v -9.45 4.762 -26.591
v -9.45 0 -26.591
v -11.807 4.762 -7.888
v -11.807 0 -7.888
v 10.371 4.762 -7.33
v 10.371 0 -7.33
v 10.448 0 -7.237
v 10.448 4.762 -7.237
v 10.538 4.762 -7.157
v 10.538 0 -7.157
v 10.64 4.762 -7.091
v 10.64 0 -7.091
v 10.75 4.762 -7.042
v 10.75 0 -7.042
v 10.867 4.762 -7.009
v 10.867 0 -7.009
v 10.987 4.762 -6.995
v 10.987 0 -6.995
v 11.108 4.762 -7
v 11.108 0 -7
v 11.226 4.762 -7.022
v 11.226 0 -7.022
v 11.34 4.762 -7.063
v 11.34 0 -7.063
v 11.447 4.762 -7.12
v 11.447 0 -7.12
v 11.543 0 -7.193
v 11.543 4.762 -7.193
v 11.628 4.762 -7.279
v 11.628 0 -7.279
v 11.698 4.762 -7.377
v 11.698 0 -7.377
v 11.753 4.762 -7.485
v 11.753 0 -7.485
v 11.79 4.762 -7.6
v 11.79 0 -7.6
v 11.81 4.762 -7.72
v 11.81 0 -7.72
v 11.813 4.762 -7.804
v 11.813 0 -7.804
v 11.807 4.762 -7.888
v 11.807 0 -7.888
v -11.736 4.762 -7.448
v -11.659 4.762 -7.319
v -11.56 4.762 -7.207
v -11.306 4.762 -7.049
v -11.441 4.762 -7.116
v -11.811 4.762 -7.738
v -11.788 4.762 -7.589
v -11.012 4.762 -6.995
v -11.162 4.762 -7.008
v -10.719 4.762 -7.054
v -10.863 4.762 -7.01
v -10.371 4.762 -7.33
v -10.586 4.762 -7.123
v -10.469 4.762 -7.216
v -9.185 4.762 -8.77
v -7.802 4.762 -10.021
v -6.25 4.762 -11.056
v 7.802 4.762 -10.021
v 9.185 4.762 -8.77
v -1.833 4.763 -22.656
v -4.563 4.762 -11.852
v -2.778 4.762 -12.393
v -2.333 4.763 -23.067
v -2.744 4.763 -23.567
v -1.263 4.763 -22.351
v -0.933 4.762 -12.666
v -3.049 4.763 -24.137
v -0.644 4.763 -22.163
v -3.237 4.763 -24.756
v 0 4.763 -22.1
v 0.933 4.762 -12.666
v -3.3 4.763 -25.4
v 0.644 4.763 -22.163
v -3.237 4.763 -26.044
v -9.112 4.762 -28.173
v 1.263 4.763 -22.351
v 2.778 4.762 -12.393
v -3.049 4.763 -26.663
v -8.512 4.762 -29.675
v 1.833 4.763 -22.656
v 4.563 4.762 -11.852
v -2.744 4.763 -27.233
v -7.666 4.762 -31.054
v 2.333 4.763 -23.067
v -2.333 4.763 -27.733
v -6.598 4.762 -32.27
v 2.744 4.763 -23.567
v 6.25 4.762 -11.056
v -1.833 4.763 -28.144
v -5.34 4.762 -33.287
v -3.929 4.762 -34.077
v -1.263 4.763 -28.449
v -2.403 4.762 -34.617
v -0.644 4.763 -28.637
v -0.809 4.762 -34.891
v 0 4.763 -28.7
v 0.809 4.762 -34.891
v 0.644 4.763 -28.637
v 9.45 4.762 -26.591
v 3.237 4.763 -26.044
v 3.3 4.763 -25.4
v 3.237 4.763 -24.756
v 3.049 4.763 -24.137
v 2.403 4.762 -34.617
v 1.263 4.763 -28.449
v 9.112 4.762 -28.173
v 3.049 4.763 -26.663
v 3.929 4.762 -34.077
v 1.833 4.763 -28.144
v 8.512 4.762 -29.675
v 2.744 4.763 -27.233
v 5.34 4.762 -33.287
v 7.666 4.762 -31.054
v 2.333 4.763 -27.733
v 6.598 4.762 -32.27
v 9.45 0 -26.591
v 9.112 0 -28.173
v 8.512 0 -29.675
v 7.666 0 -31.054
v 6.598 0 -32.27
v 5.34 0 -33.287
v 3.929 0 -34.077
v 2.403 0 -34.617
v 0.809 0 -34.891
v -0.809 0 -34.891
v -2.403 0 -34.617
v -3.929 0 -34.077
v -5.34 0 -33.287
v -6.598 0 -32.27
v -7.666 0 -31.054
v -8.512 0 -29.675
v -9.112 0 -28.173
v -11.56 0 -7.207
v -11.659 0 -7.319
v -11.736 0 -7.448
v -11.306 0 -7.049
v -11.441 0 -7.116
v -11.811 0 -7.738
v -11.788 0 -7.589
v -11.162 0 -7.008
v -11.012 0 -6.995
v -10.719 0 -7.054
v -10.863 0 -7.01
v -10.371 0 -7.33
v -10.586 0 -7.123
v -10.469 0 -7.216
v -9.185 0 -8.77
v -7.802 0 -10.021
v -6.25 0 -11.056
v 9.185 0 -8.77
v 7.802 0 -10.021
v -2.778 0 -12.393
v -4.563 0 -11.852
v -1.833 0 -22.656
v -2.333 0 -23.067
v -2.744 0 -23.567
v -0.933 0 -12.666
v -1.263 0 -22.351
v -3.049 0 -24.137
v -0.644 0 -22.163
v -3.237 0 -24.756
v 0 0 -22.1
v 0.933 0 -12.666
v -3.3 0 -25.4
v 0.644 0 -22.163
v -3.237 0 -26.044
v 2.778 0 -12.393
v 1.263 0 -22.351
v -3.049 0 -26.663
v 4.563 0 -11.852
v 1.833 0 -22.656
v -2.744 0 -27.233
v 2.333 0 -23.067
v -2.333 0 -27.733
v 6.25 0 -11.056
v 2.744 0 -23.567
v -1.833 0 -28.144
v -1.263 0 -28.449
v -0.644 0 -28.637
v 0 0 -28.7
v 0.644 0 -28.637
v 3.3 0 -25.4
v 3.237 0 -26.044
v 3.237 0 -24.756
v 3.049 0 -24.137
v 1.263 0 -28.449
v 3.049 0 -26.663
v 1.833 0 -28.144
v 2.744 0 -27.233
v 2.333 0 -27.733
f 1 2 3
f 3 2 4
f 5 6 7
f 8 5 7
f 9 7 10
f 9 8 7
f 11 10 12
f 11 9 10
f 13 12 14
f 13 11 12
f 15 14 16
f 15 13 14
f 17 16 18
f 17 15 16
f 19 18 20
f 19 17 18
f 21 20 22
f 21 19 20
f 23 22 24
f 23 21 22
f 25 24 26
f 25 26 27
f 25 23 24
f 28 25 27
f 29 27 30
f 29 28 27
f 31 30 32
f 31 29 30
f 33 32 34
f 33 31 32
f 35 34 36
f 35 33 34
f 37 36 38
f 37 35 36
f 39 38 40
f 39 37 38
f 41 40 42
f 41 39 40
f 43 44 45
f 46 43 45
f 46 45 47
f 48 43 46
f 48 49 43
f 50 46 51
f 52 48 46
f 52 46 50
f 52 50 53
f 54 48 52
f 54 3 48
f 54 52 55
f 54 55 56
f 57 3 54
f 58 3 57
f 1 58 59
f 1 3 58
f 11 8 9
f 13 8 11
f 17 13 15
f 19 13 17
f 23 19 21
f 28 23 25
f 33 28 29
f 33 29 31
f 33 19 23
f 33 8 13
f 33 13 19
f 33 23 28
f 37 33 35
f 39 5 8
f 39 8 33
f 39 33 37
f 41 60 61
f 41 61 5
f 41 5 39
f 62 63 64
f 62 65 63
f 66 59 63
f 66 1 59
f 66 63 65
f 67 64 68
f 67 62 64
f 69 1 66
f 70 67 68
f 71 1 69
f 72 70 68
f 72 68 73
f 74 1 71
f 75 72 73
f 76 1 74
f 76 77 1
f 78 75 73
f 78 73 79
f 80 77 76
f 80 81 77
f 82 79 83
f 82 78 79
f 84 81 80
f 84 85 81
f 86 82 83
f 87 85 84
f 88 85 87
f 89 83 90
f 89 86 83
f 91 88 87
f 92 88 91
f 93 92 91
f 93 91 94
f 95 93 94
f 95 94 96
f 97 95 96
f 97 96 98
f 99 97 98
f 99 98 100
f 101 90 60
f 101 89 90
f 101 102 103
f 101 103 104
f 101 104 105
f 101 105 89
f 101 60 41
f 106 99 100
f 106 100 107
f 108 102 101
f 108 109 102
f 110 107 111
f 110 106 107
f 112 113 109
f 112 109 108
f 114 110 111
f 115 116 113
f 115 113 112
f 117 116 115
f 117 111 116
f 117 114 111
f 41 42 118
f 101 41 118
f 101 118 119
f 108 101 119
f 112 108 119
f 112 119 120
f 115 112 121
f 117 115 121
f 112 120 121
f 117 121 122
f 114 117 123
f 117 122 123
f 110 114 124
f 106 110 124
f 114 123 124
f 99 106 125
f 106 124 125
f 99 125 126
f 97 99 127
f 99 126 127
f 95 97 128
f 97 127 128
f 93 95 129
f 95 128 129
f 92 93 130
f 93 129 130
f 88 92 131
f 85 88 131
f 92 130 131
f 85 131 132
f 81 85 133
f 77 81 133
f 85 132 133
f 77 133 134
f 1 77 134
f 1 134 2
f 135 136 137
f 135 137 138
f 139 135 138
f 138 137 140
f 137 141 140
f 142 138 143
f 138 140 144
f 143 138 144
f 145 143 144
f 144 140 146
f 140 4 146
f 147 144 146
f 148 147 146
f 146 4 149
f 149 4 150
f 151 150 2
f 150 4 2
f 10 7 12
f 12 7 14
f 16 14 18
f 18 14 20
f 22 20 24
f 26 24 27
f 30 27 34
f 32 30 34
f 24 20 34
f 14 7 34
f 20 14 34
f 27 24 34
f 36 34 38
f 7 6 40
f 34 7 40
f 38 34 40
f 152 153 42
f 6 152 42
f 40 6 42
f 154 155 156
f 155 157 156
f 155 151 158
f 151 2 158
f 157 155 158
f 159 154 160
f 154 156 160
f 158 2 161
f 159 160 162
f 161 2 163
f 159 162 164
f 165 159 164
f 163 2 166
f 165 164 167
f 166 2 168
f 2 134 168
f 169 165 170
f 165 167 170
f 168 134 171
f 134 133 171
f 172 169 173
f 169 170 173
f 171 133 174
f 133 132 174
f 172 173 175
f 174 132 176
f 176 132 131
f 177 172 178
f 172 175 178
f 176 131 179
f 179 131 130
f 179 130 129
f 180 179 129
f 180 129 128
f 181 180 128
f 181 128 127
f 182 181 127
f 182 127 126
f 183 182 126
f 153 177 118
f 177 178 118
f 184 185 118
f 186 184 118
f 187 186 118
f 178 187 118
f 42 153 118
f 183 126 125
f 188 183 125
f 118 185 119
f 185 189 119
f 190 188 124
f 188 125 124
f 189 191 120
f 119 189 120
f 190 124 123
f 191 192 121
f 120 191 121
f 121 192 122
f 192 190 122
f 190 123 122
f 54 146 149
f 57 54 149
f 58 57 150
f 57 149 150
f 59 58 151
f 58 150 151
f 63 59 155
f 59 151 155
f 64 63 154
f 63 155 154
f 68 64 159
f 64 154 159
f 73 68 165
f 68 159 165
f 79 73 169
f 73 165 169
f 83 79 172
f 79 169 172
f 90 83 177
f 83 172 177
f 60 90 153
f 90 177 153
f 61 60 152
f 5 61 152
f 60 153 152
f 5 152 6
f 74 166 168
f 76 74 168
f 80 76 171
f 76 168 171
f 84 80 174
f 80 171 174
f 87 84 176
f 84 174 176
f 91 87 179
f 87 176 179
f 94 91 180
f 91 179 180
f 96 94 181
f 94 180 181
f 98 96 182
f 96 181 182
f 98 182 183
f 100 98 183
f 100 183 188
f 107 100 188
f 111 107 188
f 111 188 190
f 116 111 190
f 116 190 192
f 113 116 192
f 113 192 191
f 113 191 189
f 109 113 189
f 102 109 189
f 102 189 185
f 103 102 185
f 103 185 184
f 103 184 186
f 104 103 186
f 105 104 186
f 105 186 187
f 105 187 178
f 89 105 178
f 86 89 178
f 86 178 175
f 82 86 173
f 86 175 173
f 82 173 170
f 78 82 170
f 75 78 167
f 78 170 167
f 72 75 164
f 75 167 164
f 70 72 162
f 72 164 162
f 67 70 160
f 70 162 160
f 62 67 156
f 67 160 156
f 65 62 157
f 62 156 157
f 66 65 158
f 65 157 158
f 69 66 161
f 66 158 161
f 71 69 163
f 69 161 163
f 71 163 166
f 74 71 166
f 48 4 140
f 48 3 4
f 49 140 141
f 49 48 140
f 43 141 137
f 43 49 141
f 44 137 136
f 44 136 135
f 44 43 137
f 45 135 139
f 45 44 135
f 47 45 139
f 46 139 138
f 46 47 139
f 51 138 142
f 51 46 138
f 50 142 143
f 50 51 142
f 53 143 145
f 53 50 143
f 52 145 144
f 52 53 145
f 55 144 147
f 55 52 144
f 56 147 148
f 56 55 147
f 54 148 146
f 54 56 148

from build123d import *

# Parameters (mm, degrees)
BOSS_EXTRUDE1_DEPTH  = 4.7625
FILLET1_R            = 0.79375
M6_CLEARANCE_HOLE1_D = 6.6


with BuildPart() as part:
    # Sketch1 → Boss-Extrude1 (new body)
    with BuildSketch(Plane(origin=(0, 0, 0), x_dir=(1, 0, 0), z_dir=(0, 1, 0))):
        with BuildLine():
            Line((-9.450292964208833, 26.590625), (-12.60039061894511, 1.5874999999999988))
            ThreePointArc((-12.60039061894511, 1.5875000000000075), (6.42e-15, 12.699999999999998), (12.600390618945111, 1.587499999999999))
            Line((12.60039061894511, 1.5874999999999988), (9.450292964208833, 26.590625))
            ThreePointArc((9.450292964208835, 26.590625), (5.8e-16, 34.925), (-9.450292964208835, 26.590625))
        make_face()
    extrude(amount=BOSS_EXTRUDE1_DEPTH)

    # Fillet1
    fillet1_edges = [part.edges().sort_by_distance(p)[0] for p in [
        (12.60039061894511, 2.38125, -1.5874999999999981),
        (-12.60039061894511, 2.38125, -1.587500000000003),
    ]]
    fillet(fillet1_edges, radius=FILLET1_R)

    # M6 Clearance Hole1 (through all)
    with Locations(Plane(origin=(0, 4.7625, 0), x_dir=(1, 0, 0), z_dir=(0, 1, 0))):
        with Locations((0, 25.4)):
            Hole(M6_CLEARANCE_HOLE1_D / 2)


solid = part.part
